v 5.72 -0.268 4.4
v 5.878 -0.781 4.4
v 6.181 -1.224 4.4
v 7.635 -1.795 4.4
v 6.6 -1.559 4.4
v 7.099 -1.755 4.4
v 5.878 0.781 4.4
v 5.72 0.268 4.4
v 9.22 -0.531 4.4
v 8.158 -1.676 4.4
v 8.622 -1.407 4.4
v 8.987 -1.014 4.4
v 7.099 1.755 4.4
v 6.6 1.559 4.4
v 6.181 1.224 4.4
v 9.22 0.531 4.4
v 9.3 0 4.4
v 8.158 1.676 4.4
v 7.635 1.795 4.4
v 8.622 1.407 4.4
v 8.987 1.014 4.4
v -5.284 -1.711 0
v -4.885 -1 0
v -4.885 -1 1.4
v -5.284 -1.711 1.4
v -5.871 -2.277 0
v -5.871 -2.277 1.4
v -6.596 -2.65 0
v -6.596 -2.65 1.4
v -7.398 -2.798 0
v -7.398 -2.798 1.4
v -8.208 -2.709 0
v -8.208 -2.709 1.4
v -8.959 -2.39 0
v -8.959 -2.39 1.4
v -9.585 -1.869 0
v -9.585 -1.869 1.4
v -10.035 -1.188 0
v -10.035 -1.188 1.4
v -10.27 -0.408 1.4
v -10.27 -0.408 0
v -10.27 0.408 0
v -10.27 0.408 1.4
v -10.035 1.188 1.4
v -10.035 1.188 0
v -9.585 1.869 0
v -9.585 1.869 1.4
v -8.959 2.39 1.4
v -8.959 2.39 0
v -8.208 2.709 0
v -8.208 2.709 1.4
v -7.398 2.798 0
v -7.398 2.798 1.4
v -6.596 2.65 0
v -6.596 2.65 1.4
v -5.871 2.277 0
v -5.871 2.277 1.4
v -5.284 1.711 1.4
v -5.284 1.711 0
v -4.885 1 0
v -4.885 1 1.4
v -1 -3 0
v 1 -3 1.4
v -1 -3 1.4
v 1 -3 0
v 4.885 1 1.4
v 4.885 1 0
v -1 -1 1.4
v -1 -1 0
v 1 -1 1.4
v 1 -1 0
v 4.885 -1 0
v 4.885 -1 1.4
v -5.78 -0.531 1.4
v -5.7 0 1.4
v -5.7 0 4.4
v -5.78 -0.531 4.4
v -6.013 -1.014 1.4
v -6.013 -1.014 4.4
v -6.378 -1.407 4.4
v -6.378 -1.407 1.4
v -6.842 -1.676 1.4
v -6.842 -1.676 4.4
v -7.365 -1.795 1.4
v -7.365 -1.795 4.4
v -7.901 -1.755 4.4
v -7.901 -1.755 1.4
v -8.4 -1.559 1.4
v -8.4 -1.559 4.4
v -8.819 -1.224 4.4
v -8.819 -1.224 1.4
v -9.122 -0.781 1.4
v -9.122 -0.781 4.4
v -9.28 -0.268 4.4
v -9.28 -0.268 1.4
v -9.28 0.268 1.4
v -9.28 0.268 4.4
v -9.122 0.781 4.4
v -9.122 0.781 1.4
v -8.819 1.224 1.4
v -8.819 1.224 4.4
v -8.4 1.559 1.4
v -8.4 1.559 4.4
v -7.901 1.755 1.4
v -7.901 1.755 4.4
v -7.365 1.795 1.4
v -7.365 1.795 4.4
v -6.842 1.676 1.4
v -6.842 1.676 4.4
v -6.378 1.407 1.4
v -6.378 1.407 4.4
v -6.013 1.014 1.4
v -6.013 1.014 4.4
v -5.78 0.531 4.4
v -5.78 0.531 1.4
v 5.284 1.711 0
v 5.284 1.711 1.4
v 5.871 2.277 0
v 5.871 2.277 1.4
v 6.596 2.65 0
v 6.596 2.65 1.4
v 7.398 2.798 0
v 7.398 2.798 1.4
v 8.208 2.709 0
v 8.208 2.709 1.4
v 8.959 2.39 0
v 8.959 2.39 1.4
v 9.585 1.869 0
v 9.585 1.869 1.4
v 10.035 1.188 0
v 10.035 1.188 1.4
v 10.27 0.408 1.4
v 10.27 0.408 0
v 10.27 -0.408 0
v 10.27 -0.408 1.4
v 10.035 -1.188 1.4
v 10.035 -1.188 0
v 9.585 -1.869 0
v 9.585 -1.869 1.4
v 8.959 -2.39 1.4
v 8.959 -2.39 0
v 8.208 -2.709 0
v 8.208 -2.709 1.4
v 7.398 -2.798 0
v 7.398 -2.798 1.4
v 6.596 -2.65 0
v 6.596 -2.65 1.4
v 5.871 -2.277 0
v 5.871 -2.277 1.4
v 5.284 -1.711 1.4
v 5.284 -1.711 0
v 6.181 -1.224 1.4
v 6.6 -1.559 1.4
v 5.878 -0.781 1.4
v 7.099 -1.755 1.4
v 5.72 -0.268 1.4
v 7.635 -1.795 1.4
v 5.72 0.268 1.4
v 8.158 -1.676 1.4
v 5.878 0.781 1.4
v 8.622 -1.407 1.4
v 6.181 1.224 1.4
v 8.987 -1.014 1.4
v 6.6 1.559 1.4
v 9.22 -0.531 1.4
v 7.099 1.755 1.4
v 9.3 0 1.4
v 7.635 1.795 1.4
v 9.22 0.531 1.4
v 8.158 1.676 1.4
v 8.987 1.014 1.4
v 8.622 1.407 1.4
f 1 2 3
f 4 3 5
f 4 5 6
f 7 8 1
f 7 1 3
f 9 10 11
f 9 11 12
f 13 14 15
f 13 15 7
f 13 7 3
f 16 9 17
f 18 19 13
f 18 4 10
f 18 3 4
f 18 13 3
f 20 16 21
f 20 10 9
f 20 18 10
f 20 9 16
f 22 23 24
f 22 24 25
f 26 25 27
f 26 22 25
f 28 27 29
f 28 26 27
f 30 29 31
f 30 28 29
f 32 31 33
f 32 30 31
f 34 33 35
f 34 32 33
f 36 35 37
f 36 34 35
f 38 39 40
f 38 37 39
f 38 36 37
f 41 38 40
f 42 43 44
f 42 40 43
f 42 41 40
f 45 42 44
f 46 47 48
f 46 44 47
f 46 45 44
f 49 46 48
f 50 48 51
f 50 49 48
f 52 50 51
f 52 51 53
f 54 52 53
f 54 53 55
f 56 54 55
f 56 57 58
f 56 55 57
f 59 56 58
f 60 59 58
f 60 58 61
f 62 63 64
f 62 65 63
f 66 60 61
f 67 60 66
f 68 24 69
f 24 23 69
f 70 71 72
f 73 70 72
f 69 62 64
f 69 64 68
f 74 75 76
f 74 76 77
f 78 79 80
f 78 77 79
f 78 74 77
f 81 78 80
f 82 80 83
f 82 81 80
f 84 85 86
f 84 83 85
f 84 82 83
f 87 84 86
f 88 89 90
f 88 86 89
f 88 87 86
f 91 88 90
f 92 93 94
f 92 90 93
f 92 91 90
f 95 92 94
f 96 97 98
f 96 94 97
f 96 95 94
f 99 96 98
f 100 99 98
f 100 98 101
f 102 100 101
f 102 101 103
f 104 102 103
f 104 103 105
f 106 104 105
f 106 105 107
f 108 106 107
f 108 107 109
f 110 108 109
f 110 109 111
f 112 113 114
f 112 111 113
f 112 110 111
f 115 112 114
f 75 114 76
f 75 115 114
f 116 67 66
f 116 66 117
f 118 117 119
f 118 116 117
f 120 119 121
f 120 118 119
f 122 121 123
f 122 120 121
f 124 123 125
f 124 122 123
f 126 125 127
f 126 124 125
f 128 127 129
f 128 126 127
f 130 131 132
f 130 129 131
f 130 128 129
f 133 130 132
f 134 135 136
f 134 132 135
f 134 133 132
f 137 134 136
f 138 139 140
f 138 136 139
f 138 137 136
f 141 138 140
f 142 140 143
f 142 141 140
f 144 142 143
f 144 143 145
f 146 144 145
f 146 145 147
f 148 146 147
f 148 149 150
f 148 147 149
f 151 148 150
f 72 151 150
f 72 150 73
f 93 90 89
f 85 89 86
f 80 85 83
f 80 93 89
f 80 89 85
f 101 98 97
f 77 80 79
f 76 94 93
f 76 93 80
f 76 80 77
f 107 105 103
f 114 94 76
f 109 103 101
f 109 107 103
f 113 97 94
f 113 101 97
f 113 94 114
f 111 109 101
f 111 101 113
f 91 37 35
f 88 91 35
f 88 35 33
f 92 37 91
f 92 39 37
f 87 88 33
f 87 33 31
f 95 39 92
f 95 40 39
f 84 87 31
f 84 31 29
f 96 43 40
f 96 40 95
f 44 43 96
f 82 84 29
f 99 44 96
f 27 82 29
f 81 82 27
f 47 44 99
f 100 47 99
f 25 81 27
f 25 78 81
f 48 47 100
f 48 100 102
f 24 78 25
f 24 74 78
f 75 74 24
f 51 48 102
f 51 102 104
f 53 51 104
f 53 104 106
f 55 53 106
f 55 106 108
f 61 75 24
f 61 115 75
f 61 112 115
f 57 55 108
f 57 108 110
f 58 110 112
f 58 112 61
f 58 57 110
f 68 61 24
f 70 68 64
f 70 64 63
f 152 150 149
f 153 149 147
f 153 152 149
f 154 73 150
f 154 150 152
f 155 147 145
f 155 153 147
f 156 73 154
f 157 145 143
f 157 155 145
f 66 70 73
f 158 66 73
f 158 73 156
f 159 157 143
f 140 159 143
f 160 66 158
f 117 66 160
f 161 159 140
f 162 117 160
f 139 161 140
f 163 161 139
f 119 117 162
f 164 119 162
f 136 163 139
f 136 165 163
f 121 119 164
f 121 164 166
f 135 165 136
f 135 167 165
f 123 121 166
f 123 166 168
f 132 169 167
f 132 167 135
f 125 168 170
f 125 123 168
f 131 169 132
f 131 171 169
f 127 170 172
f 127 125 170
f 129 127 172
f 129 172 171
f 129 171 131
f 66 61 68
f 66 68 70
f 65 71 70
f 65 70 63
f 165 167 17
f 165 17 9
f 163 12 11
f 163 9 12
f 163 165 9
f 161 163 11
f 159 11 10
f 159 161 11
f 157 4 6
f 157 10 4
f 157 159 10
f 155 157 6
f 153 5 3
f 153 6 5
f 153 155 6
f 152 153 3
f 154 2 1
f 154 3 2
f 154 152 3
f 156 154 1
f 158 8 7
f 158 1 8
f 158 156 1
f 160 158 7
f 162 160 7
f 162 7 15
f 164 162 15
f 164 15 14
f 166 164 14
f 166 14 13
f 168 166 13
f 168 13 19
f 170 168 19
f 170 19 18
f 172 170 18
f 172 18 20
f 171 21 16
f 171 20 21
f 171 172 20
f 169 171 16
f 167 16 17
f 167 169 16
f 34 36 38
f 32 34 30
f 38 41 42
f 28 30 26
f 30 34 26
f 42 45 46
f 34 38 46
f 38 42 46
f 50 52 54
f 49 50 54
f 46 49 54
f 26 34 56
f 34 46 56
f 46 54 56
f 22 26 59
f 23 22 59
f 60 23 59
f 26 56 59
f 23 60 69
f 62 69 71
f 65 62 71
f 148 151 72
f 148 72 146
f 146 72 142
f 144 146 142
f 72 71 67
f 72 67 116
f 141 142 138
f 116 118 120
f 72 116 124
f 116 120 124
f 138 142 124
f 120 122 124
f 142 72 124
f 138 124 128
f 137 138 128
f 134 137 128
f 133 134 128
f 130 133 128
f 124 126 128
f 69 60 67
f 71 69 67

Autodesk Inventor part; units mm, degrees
ref_plane "YZ Plane" through (0, 0, 0) normal (1, 0, 0) x (0, 1, 0)
ref_plane "XZ Plane" through (0, 0, 0) normal (0, 1, 0) x (-1, 0, 0)
ref_plane "XY Plane" through (0, 0, 0) normal (0, 0, 1) x (1, 0, 0)
sketch "Эскиз1" plane through (0, 0, 0) normal (0, 0, 1) x (1, 0, 0)
  arc A0 (-4.8847, 1) -> (-4.8847, -1) centre (-7.5, 0) ccw
  arc A1 (4.8847, -1) -> (4.8847, 1) centre (7.5, 0) ccw
  line L0 (-7.5, 0) -> (7.5, 0) construction
  line L1 (-4.8847, 1) -> (4.8847, 1)
  line L2 (1, -1) -> (1, -3)
  line L3 (1, -3) -> (-1, -3)
  line L4 (-1, -3) -> (-1, -1)
  line L5 (-4.8847, -1) -> (-1, -1)
  line L6 (1, -1) -> (4.8847, -1)
  point P0 (0, 0)
  point P1 (0, 1)
  point P2 (0, -3)
  point P3 (0, 0)
  dimension "d0" = 5.6
  dimension "d1" = 5.6
  dimension "d2" = 15
  dimension "d3" = 1
  dimension "d7" = 2
  dimension "d8" = 2
extrude "Выдавливание1" add sketch "Эскиз1" along normal blind 1.4
sketch "Эскиз2" plane through (0, 0, 1.4) normal (0, 0, 1) x (1, 0, 0)
  arc A0 (-4.8847, 1) -> (-4.8847, -1) centre (-7.5, 0) ccw projected
  arc A1 (4.8847, -1) -> (4.8847, 1) centre (7.5, 0) ccw projected
  circle A2 centre (-7.5, 0) radius 1.8
  circle A3 centre (7.5, 0) radius 1.8
  point P0 (0, 0)
  dimension "d11" = 3.6
  dimension "d12" = 3.6
extrude "Выдавливание2" add sketch "Эскиз2" along normal blind 3
properties part number "fwd_rev_btns"
